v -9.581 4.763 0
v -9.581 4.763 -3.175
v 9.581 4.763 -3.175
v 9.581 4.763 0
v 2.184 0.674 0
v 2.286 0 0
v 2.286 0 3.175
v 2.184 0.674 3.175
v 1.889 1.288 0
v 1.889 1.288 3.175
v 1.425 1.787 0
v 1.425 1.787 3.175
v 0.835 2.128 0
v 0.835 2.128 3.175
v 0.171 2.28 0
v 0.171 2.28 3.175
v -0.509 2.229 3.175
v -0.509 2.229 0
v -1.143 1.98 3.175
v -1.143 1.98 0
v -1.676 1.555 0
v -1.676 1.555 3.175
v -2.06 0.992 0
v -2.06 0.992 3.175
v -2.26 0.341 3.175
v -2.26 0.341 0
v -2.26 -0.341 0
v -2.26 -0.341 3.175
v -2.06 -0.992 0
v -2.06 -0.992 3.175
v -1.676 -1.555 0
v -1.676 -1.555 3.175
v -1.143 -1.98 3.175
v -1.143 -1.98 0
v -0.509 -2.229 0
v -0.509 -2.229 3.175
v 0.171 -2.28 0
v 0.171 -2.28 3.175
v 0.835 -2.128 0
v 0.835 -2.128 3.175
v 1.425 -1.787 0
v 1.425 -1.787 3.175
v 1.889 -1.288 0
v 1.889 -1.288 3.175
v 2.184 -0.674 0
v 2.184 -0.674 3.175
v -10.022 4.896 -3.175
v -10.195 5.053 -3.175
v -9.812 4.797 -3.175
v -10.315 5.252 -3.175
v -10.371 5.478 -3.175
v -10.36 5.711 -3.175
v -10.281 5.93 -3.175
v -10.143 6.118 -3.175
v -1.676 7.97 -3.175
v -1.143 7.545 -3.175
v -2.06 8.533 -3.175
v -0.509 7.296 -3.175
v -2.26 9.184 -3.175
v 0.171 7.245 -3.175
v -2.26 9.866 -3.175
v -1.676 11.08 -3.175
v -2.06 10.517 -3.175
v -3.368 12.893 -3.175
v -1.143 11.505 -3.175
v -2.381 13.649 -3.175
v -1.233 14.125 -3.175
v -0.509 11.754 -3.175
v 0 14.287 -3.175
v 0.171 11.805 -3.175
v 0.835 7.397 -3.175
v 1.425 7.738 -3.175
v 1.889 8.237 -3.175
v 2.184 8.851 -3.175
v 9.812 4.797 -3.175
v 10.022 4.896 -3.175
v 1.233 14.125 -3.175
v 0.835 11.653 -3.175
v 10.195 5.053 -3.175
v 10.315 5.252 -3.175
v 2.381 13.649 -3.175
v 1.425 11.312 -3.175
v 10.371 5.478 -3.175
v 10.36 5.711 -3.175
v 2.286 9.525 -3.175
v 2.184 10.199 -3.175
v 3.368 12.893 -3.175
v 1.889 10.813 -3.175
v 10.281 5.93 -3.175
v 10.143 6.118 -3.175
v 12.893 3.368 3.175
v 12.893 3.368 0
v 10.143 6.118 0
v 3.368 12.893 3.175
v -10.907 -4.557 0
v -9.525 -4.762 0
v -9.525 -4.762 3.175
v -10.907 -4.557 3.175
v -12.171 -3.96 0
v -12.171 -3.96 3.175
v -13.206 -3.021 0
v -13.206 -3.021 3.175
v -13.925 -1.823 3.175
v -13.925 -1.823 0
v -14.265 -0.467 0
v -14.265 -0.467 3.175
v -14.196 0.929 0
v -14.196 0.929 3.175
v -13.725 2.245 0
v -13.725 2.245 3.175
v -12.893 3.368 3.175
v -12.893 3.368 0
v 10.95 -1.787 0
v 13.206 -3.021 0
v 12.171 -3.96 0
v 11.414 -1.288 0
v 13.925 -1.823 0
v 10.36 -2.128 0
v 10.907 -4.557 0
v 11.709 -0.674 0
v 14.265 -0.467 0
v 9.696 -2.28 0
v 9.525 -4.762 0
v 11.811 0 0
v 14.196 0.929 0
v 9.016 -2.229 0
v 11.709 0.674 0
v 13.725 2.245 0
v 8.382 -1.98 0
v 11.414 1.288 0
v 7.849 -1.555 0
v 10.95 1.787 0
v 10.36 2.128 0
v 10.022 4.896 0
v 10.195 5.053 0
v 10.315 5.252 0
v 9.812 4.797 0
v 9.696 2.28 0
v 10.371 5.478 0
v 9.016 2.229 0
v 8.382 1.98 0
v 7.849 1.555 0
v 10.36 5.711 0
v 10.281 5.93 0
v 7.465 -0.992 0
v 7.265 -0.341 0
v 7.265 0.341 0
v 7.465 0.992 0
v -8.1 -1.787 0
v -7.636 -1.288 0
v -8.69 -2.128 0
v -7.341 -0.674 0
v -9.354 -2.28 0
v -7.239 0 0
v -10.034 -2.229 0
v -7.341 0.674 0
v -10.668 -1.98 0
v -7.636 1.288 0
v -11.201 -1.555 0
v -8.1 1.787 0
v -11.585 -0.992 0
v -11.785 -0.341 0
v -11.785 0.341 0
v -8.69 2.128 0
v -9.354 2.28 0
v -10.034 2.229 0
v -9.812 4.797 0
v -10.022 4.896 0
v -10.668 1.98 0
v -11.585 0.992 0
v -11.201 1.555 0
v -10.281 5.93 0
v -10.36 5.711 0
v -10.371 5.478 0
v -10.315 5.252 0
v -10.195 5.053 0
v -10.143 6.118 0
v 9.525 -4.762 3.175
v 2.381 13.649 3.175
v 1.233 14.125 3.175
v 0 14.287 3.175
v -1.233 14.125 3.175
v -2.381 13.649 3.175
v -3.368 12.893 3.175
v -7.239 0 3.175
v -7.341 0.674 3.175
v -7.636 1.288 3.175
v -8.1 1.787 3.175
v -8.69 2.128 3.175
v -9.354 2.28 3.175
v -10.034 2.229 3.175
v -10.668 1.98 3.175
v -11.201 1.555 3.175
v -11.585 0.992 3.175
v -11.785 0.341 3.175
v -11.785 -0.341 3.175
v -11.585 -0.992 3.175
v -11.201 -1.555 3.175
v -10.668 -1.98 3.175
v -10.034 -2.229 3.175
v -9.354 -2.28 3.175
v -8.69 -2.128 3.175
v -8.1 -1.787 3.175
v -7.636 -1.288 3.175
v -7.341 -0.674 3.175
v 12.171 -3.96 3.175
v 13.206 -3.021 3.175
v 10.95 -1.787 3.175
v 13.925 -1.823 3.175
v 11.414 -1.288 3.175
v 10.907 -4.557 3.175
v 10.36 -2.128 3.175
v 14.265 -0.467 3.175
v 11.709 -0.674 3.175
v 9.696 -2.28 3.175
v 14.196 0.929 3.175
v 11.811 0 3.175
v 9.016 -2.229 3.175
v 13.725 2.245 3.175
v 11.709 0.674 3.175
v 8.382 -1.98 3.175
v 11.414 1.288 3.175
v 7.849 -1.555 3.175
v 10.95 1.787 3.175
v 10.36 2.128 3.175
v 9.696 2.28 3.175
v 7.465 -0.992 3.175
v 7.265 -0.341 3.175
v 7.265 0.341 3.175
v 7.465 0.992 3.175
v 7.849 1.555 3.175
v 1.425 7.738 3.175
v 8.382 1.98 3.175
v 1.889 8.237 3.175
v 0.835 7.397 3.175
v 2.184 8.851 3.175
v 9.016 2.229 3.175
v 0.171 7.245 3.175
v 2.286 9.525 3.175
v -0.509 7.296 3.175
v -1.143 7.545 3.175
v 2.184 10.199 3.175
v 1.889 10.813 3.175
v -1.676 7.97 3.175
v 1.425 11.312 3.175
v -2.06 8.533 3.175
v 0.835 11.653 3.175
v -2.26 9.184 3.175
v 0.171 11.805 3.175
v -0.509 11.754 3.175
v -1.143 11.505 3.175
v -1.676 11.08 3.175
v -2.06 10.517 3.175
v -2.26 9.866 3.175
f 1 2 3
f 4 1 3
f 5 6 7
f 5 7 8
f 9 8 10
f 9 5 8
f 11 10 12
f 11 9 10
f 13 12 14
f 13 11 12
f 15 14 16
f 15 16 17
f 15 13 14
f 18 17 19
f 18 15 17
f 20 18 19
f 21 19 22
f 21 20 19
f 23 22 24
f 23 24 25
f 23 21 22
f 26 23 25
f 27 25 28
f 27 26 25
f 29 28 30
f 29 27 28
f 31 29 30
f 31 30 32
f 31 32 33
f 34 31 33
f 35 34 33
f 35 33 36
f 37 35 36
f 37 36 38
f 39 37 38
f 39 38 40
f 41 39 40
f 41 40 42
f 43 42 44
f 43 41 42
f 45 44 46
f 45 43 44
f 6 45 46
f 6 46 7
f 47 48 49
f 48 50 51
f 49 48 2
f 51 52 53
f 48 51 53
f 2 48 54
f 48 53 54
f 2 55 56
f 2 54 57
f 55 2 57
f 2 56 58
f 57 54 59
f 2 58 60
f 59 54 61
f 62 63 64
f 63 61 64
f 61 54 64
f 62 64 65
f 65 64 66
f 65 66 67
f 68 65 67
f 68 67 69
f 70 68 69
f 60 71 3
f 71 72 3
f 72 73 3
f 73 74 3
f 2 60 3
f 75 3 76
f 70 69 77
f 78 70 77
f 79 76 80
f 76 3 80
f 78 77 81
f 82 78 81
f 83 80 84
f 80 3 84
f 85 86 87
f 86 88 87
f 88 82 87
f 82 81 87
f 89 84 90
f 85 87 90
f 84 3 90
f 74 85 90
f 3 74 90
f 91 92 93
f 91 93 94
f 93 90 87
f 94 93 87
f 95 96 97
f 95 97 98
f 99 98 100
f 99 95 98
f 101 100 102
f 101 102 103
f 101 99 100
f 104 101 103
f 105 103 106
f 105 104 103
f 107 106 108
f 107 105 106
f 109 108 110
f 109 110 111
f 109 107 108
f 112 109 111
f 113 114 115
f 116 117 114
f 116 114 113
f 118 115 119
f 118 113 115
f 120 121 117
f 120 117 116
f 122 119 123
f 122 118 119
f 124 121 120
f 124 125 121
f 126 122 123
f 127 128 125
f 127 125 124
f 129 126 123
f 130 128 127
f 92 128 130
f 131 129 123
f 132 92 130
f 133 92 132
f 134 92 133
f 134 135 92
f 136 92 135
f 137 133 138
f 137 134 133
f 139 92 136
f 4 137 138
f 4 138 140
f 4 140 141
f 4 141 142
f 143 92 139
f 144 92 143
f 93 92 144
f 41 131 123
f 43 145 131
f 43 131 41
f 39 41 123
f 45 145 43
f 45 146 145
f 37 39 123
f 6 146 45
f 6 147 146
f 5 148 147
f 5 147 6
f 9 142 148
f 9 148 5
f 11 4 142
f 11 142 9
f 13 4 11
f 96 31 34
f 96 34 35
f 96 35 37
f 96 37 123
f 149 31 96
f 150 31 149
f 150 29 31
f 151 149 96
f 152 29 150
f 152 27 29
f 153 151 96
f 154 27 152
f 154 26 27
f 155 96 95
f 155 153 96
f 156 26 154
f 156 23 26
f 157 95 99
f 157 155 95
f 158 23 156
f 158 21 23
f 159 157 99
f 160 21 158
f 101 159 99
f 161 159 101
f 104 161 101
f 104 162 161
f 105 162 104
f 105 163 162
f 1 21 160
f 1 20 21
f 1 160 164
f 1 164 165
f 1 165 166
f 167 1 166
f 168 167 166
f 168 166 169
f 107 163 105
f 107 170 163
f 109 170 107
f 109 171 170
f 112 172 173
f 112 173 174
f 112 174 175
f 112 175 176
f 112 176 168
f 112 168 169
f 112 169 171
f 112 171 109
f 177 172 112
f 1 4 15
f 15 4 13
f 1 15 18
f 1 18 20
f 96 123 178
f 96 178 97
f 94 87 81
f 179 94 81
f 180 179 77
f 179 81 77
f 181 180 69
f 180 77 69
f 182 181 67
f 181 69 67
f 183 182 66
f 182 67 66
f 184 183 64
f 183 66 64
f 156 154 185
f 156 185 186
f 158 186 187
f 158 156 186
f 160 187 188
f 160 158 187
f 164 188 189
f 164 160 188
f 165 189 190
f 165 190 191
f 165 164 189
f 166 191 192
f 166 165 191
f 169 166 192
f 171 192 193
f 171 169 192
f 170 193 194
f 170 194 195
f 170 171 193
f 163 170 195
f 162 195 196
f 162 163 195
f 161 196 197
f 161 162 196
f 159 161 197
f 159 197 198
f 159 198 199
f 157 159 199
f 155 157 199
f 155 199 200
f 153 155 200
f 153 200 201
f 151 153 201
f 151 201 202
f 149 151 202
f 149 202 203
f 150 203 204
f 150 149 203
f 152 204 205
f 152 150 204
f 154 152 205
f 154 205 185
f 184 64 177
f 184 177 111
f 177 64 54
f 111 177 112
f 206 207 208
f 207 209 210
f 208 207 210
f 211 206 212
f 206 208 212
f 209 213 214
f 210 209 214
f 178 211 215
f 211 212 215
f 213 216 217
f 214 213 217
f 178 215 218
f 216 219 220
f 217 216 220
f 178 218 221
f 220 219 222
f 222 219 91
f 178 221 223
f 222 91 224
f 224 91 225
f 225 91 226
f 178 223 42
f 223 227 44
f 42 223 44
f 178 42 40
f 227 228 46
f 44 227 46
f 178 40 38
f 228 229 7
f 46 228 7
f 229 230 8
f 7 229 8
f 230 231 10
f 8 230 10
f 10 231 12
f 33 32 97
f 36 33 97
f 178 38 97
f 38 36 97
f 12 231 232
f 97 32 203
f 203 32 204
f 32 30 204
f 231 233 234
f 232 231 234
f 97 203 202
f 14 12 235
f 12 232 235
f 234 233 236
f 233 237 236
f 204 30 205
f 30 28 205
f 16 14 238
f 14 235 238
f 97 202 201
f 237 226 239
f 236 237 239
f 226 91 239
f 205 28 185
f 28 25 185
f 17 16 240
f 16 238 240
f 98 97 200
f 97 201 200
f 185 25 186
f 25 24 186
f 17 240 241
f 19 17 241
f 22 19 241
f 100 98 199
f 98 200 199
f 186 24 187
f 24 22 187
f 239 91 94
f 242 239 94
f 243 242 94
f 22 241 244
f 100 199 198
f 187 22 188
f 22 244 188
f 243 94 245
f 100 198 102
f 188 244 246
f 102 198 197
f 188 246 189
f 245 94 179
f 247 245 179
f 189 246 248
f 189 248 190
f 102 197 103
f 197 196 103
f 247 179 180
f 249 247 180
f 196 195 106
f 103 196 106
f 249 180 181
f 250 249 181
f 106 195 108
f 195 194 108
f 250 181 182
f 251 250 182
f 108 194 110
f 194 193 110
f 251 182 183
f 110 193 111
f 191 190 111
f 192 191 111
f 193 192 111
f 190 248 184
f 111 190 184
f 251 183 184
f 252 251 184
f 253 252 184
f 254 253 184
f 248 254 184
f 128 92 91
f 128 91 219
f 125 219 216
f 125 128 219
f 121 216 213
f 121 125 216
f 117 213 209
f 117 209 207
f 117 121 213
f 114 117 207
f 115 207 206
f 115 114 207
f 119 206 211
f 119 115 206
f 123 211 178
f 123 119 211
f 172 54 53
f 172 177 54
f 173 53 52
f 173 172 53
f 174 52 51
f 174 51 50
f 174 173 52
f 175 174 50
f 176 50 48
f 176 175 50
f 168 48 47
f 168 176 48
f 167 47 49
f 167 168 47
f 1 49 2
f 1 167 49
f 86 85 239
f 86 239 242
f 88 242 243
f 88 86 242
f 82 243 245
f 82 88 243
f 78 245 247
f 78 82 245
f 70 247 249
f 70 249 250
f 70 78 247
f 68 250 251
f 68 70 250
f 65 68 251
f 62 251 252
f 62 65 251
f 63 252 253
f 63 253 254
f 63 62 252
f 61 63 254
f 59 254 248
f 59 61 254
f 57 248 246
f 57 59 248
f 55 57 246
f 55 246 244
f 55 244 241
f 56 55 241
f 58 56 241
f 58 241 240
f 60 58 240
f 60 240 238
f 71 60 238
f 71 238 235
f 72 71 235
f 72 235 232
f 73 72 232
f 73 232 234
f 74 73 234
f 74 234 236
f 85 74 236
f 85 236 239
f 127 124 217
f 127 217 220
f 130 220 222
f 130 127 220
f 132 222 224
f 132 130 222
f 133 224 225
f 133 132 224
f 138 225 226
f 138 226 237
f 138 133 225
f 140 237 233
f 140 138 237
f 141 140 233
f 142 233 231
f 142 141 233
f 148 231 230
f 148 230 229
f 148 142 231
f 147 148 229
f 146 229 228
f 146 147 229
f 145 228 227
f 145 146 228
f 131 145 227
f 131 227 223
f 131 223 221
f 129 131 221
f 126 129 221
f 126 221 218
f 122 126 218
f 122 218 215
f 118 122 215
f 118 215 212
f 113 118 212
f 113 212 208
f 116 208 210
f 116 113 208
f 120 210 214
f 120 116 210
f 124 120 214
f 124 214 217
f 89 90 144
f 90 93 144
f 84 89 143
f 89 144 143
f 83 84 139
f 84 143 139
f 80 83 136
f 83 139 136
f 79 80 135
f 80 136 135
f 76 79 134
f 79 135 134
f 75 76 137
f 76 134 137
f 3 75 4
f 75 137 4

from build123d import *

# Parameters (mm, degrees)
SKETCH1_R           = 2.286
SKETCH1_R_2         = 2.2859999999999996
BOSS_EXTRUDE1_DEPTH = 3.175
BOSS_EXTRUDE2_START = -3.175
SKETCH1_4_R         = 2.2859999999999996
BOSS_EXTRUDE2_DEPTH = 3.175
FILLET1_R           = 0.79375


with BuildPart() as part:
    # Sketch1 → Boss-Extrude1 (new body)
    with BuildSketch(Plane.XY):
        with BuildLine():
            ThreePointArc((-12.89259604540093, 3.3675960454009317), (-13.924976273585003, -1.82252984663874), (-9.524999999999999, -4.762500000000001))
            Line((-9.525, -4.7625), (9.525, -4.762499999999998))
            ThreePointArc((9.525, -4.762499999999998), (13.924976273585004, -1.8225298466387378), (12.892596045400932, 3.3675960454009357))
            Line((12.892596045400932, 3.3675960454009357), (3.3675960454009335, 12.892596045400932))
            ThreePointArc((3.3675960454009344, 12.892596045400932), (2.66e-15, 14.287499999999998), (-3.367596045400929, 12.892596045400932))
            Line((-3.367596045400929, 12.892596045400932), (-12.892596045400932, 3.3675960454009317))
        make_face()
        with Locations((-9.525, 0)):
            Circle(SKETCH1_R, mode=Mode.SUBTRACT)
        Circle(SKETCH1_R, mode=Mode.SUBTRACT)
        with Locations((9.525, 3.5e-15)):
            Circle(SKETCH1_R, mode=Mode.SUBTRACT)
        with Locations((2.6e-15, 9.525)):
            Circle(SKETCH1_R_2, mode=Mode.SUBTRACT)
    extrude(amount=BOSS_EXTRUDE1_DEPTH)

    # Sketch1<4> → Boss-Extrude2 (add)
    with BuildSketch(Plane.XY.offset(BOSS_EXTRUDE2_START)):
        with BuildLine():
            Line((-3.367596045400928, 12.892596045400932), (-11.49769209080186, 4.762500000000003))
            Line((-11.49769209080186, 4.762500000000004), (11.497692090801866, 4.762500000000003))
            Line((11.497692090801866, 4.762500000000002), (3.3675960454009335, 12.892596045400932))
            ThreePointArc((3.3675960454009344, 12.892596045400932), (2.66e-15, 14.287499999999998), (-3.367596045400929, 12.892596045400932))
        make_face()
        with Locations((2.6e-15, 9.525)):
            Circle(SKETCH1_4_R, mode=Mode.SUBTRACT)
    extrude(amount=BOSS_EXTRUDE2_DEPTH)

    # Fillet1
    fillet1_edges = [part.edges().sort_by_distance(p)[0] for p in [
        (-11.49769209080186, 4.762500000000003, -1.5875),
        (11.497692090801866, 4.762500000000003, -1.5875),
    ]]
    fillet(fillet1_edges, radius=FILLET1_R)


solid = part.part
